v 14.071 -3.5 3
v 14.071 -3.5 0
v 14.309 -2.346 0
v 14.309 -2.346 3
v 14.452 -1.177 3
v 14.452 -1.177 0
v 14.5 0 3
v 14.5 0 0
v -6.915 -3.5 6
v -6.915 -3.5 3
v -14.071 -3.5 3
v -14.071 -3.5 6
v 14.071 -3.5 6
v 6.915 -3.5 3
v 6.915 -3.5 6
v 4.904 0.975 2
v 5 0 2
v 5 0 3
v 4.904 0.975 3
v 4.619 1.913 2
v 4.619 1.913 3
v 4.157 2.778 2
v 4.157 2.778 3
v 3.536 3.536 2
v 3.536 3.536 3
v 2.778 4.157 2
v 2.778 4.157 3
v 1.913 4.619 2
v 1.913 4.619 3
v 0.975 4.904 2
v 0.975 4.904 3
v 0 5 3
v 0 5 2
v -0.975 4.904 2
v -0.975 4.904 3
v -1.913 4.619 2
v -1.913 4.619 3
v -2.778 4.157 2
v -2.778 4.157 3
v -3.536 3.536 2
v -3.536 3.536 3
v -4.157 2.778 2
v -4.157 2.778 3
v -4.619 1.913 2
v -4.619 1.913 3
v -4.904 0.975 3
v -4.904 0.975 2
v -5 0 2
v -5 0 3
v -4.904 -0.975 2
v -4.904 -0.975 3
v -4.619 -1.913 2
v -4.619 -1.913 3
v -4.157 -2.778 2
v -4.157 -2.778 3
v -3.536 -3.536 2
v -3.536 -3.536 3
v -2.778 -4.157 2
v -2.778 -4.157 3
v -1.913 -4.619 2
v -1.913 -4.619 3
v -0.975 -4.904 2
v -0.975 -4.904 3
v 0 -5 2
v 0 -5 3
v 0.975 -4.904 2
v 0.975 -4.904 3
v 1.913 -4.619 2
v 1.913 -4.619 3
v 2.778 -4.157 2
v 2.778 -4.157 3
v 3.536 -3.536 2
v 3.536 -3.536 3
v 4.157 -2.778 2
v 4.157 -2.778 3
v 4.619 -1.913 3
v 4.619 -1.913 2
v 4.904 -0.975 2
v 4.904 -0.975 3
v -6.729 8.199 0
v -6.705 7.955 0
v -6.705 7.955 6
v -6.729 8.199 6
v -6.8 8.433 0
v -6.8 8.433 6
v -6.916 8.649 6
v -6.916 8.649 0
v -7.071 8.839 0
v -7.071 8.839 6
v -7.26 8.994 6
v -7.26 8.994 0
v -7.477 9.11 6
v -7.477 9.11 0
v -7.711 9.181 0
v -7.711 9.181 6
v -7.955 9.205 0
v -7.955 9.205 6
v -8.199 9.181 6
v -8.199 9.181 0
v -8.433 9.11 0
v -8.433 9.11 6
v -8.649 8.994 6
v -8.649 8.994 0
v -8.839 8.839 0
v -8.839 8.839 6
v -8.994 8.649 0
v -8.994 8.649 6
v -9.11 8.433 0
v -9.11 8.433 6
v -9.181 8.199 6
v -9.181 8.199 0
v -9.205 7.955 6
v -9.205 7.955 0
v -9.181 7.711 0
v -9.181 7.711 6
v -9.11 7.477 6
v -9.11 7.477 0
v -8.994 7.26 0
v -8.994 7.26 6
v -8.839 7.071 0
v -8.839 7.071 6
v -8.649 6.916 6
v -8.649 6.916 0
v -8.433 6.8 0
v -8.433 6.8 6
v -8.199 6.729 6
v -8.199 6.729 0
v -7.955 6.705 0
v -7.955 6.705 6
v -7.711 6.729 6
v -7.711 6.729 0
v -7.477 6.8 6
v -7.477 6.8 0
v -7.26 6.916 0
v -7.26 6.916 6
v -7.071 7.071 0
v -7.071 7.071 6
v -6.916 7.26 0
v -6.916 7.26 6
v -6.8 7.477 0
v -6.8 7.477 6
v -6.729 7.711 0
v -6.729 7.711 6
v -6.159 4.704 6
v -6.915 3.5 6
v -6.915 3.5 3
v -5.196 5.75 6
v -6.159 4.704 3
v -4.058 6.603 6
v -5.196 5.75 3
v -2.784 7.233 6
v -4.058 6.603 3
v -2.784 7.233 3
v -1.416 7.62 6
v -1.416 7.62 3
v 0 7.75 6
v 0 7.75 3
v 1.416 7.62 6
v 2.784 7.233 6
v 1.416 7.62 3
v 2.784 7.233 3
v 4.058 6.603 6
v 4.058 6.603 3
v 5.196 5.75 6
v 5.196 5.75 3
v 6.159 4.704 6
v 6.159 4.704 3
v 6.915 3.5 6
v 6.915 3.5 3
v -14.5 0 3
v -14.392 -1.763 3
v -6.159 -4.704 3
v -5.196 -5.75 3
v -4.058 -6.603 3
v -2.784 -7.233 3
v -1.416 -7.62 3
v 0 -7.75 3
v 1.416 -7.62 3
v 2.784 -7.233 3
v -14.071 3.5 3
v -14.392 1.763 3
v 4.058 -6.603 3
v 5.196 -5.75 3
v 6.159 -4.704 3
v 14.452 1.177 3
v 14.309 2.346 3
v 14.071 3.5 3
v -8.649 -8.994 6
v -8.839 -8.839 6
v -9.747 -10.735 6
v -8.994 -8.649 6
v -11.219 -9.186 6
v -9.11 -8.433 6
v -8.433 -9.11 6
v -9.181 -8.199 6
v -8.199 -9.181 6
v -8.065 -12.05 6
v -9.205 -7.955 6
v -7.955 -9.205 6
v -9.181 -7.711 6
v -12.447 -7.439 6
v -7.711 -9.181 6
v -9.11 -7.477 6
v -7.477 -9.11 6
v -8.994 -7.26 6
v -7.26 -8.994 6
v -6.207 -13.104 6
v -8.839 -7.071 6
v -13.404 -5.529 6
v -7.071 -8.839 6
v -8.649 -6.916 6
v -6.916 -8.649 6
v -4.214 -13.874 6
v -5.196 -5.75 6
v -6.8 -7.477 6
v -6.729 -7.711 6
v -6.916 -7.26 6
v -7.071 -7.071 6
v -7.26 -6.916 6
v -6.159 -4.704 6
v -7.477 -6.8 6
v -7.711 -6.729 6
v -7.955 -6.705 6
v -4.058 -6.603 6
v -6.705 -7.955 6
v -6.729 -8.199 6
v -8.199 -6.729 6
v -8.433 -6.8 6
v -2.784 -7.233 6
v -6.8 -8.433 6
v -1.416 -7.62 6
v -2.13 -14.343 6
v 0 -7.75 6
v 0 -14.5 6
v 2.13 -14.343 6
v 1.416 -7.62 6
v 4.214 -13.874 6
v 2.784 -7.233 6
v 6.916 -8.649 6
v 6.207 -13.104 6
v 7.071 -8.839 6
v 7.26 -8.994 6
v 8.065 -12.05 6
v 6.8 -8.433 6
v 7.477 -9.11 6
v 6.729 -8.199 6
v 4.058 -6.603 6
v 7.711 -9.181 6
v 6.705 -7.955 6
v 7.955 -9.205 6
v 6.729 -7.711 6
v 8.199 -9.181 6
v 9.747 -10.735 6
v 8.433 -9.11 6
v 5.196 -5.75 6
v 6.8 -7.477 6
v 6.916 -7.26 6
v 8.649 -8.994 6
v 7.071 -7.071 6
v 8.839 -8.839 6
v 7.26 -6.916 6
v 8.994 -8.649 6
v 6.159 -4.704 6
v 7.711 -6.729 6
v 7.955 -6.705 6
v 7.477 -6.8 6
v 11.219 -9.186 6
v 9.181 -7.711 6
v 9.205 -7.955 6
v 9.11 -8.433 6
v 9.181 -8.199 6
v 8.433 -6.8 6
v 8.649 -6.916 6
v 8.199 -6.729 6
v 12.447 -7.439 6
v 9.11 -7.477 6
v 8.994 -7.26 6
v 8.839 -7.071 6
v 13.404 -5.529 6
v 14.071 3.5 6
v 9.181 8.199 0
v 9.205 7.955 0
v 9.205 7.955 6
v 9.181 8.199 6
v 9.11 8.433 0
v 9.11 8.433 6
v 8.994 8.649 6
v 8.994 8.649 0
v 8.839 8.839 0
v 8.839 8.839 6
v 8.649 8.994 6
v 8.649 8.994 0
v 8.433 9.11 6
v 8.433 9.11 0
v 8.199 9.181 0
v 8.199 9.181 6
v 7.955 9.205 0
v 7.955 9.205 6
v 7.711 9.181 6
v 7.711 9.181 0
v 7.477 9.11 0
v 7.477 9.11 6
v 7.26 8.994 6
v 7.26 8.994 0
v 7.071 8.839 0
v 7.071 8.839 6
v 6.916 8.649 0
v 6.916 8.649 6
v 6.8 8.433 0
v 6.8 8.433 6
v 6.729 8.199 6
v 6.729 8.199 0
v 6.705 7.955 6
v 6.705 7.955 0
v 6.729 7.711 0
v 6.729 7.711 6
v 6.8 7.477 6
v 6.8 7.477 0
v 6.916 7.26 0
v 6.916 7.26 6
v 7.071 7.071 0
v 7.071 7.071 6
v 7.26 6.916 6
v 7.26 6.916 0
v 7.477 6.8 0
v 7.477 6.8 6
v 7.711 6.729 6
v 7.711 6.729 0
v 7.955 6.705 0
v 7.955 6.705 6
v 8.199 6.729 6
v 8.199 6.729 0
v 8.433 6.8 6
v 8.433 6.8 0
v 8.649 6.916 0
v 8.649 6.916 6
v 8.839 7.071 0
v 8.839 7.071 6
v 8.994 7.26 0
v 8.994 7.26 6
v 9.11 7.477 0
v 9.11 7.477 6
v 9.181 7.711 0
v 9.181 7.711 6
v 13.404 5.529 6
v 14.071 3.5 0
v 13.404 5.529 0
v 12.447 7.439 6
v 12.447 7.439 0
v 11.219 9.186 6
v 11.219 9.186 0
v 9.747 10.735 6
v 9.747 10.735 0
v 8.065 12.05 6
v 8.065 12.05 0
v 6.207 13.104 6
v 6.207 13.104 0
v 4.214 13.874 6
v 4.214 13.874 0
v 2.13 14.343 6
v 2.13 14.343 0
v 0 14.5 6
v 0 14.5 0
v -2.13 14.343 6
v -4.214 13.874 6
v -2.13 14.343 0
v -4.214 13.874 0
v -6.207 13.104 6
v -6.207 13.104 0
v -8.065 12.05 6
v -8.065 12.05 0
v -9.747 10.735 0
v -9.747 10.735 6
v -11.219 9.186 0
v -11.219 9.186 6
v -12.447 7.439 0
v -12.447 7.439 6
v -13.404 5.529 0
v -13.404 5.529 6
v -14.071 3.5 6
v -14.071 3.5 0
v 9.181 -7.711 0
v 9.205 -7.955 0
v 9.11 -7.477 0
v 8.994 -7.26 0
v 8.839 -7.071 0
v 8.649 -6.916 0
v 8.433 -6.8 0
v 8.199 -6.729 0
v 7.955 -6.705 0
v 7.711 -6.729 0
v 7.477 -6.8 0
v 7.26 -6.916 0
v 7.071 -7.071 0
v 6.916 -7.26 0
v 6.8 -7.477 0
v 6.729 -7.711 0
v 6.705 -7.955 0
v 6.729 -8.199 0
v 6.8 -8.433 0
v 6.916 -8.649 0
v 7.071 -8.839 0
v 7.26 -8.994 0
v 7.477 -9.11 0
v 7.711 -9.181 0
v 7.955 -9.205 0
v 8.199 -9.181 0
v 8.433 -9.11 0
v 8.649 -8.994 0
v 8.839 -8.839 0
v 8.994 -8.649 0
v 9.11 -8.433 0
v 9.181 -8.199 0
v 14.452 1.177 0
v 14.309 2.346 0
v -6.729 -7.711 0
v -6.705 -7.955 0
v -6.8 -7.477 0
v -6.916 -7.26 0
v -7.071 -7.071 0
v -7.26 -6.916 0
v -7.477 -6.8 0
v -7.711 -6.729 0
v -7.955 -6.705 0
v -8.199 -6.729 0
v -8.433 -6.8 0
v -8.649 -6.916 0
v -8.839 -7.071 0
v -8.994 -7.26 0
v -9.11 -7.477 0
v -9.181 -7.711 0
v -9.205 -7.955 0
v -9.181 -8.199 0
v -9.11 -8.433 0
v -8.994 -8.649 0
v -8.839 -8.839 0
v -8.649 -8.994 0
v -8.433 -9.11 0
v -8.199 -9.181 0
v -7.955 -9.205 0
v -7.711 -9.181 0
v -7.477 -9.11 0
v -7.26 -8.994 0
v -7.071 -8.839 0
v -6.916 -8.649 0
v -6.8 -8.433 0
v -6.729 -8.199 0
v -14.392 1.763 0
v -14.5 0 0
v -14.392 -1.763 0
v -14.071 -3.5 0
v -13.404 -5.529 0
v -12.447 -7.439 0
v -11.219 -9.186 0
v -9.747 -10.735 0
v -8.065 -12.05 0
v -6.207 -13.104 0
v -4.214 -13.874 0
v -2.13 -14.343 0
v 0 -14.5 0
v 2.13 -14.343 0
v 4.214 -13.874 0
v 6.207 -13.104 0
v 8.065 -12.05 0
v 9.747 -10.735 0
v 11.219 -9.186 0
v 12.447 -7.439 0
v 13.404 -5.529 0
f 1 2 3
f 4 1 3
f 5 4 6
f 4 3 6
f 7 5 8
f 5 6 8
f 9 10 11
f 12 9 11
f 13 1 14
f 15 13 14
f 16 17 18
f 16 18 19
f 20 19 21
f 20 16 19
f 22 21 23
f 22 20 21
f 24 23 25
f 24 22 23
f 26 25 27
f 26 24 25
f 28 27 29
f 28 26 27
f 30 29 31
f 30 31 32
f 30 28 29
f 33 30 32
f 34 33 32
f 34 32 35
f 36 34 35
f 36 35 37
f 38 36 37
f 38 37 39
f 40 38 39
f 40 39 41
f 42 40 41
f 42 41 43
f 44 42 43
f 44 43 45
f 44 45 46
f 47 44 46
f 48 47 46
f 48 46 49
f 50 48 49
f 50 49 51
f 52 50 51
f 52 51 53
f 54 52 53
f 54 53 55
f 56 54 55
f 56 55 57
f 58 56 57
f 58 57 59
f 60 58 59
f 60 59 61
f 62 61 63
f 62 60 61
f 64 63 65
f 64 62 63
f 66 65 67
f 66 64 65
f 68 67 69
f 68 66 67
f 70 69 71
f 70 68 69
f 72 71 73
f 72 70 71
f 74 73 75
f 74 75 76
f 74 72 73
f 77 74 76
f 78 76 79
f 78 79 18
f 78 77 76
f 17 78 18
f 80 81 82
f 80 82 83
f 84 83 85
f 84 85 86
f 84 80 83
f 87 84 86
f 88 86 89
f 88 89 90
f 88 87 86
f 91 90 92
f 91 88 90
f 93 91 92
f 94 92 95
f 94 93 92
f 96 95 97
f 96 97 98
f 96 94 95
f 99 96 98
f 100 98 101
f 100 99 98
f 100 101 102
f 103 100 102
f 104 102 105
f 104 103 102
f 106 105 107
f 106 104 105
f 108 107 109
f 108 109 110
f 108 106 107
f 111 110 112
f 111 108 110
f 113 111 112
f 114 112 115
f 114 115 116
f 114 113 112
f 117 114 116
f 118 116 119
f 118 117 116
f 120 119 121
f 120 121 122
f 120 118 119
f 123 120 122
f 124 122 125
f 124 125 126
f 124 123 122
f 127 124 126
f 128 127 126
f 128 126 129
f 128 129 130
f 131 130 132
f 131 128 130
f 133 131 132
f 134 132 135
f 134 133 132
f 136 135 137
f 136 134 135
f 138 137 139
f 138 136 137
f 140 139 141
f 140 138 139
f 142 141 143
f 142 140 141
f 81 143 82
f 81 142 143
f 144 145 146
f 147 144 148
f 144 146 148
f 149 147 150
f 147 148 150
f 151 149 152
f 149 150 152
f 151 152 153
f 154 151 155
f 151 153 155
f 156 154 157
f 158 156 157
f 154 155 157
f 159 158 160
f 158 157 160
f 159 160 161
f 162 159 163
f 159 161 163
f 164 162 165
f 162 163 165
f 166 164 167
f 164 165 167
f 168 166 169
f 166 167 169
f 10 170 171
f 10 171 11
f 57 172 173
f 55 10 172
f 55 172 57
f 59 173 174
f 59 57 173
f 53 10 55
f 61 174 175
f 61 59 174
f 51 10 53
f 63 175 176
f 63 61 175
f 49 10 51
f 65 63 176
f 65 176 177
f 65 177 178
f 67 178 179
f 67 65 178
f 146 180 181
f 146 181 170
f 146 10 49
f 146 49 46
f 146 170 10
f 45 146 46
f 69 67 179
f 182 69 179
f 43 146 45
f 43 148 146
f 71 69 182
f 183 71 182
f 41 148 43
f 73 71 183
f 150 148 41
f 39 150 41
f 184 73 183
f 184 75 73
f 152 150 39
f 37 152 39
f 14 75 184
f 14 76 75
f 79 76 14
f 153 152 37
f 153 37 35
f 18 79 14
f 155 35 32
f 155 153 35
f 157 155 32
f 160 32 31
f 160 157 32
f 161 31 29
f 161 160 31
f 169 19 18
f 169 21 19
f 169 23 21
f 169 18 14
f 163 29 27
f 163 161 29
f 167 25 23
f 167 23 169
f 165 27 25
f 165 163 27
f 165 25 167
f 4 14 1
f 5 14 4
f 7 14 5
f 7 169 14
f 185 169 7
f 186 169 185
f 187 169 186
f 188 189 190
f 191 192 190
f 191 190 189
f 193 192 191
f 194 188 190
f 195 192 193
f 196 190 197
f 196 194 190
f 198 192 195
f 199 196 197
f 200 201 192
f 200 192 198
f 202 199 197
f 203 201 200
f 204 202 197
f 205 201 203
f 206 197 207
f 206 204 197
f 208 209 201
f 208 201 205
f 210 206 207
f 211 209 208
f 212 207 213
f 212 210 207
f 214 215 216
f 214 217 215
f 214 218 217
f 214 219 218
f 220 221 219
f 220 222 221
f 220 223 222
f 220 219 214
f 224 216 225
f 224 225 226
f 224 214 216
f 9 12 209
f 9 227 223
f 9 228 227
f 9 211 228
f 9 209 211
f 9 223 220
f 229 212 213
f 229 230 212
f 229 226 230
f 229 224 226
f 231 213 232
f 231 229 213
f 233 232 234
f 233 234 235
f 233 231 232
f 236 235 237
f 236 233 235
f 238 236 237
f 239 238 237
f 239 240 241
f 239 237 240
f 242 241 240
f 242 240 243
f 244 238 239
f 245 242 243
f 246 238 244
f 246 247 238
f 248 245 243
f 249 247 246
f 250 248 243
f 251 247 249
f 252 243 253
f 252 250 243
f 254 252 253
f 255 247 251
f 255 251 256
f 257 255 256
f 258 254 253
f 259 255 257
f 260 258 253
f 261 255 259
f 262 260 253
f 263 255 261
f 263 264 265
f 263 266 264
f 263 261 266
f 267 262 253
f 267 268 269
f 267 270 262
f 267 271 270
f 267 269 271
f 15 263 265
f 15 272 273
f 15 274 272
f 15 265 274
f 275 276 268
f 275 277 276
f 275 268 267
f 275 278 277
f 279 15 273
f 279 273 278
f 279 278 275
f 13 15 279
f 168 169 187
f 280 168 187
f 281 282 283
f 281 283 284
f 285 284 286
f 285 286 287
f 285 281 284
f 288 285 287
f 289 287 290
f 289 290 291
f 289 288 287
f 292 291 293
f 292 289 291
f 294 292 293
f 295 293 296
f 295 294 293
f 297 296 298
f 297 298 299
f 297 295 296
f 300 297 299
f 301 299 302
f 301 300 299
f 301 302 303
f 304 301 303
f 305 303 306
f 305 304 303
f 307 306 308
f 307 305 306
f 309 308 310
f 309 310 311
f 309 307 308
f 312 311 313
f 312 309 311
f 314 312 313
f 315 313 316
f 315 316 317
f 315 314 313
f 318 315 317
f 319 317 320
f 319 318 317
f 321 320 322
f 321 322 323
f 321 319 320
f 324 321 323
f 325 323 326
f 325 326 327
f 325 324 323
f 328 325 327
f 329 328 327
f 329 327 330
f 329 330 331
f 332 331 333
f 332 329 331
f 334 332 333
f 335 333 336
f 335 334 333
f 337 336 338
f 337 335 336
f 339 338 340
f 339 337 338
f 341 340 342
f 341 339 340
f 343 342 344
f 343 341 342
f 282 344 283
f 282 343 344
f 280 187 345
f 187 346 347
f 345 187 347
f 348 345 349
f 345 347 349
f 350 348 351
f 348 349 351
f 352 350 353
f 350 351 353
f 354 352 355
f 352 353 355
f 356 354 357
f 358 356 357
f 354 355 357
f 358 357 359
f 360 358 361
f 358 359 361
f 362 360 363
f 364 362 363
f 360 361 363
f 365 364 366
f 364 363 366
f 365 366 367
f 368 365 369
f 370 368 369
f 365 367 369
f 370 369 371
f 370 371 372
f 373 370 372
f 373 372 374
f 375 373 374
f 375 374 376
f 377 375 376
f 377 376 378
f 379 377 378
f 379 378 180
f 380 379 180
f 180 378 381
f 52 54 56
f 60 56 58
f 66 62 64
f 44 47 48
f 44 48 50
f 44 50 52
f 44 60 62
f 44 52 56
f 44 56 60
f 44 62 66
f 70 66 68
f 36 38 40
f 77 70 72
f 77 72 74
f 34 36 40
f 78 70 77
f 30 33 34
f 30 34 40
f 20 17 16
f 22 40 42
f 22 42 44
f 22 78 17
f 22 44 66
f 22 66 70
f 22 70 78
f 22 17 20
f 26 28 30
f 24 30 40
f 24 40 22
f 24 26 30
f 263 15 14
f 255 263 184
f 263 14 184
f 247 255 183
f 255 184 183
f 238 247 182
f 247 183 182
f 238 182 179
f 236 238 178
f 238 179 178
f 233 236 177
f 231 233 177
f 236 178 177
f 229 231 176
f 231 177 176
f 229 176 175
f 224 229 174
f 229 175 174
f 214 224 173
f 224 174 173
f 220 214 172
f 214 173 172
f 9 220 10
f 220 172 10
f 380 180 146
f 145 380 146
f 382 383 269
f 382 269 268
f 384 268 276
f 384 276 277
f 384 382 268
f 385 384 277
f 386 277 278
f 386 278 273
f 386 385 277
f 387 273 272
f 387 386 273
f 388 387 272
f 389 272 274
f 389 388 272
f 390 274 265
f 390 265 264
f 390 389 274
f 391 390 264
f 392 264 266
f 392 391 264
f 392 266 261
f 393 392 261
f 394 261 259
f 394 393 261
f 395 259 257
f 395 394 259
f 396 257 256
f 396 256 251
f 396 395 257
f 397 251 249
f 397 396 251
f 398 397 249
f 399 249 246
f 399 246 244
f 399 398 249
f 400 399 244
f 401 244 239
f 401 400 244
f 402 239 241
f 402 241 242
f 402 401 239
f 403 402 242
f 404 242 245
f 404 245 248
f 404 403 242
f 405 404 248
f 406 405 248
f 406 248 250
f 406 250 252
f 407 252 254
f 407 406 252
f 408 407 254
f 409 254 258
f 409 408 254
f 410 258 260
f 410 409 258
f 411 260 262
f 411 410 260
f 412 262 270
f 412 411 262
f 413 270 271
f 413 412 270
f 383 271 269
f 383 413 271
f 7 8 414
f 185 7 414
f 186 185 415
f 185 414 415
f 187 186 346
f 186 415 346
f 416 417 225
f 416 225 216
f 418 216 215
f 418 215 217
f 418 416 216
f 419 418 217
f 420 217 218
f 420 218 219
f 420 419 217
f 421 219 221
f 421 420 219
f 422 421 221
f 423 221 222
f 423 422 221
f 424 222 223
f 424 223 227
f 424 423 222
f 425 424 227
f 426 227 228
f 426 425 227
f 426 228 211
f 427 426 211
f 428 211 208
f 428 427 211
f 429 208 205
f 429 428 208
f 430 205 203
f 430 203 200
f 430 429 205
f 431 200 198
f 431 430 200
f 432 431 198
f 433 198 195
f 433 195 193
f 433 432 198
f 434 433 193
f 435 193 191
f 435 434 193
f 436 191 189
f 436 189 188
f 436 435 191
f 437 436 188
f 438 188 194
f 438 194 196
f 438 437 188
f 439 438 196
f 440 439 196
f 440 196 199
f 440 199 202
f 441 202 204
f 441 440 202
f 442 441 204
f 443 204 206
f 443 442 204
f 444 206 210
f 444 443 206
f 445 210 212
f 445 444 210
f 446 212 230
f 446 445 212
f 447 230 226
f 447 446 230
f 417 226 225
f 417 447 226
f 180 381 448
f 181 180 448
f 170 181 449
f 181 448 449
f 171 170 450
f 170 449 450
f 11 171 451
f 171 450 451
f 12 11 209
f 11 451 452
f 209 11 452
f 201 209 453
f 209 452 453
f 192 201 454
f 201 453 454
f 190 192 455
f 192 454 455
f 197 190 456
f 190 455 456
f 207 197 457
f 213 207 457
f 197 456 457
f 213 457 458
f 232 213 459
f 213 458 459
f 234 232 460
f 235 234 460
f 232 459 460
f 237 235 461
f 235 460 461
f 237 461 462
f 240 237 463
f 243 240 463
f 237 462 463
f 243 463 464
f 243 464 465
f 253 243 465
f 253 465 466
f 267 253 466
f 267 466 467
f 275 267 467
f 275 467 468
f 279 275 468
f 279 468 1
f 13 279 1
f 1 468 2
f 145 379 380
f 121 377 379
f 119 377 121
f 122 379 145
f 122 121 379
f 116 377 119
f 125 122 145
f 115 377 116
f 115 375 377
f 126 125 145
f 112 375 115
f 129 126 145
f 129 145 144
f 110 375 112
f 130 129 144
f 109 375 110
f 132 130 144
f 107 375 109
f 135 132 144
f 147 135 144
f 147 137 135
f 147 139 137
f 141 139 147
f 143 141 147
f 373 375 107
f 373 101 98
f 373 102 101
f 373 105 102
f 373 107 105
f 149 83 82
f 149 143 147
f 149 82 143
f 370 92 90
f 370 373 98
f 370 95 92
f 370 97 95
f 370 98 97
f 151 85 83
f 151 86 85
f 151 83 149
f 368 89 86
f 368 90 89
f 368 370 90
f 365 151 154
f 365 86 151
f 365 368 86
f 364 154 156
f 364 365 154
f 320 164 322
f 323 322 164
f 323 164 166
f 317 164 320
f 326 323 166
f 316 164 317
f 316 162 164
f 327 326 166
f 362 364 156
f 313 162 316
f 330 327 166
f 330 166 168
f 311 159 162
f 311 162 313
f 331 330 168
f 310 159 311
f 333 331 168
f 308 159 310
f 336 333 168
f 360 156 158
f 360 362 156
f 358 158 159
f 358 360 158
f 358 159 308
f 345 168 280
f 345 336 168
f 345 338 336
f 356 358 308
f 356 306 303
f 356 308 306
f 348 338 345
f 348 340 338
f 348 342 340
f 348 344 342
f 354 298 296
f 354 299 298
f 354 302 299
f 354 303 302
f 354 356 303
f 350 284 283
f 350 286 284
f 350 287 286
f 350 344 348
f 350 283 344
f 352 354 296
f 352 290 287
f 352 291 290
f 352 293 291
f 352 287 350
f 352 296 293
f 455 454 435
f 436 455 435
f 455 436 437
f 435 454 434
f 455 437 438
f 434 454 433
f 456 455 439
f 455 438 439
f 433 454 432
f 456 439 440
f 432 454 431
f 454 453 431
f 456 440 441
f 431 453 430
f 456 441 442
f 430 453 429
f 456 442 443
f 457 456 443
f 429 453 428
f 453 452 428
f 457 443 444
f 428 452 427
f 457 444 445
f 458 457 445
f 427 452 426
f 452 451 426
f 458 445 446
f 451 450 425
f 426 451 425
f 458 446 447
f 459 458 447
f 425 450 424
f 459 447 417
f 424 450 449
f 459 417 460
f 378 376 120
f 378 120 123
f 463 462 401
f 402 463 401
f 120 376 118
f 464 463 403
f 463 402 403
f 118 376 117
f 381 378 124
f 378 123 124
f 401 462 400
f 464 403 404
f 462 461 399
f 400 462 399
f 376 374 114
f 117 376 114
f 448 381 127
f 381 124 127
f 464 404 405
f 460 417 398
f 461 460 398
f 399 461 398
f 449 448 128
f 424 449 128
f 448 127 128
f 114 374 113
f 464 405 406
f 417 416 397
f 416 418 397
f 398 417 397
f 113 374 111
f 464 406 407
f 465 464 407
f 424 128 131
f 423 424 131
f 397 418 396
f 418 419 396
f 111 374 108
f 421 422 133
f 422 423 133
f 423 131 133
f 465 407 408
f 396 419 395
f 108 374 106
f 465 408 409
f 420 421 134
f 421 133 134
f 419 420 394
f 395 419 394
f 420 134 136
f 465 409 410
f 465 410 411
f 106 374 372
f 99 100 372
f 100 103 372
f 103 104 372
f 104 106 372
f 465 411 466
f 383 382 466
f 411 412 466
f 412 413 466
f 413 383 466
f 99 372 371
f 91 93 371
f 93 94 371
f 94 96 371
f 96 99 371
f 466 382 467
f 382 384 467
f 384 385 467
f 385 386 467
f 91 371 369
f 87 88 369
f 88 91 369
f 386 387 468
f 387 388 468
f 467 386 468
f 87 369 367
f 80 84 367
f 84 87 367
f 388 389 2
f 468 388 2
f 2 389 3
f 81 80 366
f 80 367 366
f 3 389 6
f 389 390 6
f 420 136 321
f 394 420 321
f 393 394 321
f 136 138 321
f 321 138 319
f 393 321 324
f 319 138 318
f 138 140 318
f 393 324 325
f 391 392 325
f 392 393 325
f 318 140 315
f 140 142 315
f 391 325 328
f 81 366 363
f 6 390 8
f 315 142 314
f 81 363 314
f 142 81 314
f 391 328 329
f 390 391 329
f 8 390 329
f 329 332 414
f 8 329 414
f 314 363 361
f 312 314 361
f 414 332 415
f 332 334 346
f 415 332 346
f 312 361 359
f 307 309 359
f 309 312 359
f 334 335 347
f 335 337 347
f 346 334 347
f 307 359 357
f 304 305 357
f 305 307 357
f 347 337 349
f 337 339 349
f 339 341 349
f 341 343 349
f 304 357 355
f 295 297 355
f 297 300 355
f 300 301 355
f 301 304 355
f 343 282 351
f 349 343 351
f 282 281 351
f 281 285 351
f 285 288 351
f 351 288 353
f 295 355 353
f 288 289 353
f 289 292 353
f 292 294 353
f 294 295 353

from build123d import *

# Parameters (mm, degrees)
F0_R     = 5
F2_DEPTH = 3
F0_R_2   = 1.25
F3_DEPTH = 6
F4_DEPTH = 2


with BuildPart() as f2:
    # F0 (on Top) → F2 (new body)
    with BuildSketch(Plane.XY):
        with BuildLine():
            Line((-6.914658343, 3.5), (-14.0712472795, 3.5))
            ThreePointArc((-14.0712472795, 3.5), (-14.5, 0), (-14.0712472795, -3.5))
            Line((-14.0712472795, -3.5), (-6.914658343, -3.5))
            ThreePointArc((-6.914658343, -3.5), (-7.75, 0), (-6.914658343, 3.5))
        make_face()
        with BuildLine():
            ThreePointArc((7.75, 0), (7.5382724201, 1.7991522784), (6.914658343, 3.5))
            ThreePointArc((6.914658343, 3.5), (0, 7.75), (-6.914658343, 3.5))
            ThreePointArc((-6.914658343, 3.5), (-7.75, 0), (-6.914658343, -3.5))
            ThreePointArc((-6.914658343, -3.5), (0, -7.75), (6.914658343, -3.5))
            ThreePointArc((6.914658343, -3.5), (7.5382724201, -1.7991522784), (7.75, 0))
        make_face()
        Circle(F0_R, mode=Mode.SUBTRACT)
        with BuildLine():
            ThreePointArc((14.0712472795, -3.5), (14.3924126809, -1.7630817405), (14.5, 0))
            ThreePointArc((14.5, 0), (14.3924126809, 1.7630817405), (14.0712472795, 3.5))
            Line((14.0712472795, 3.5), (6.914658343, 3.5))
            ThreePointArc((6.914658343, 3.5), (7.5382724201, 1.7991522784), (7.75, 0))
            ThreePointArc((7.75, 0), (7.5382724201, -1.7991522784), (6.914658343, -3.5))
            Line((6.914658343, -3.5), (14.0712472795, -3.5))
        make_face()
    extrude(amount=F2_DEPTH)

    # F0 (on Top) → F3 (join)
    with BuildSketch(Plane.XY):
        with BuildLine():
            Line((6.914658343, 3.5), (14.0712472795, 3.5))
            ThreePointArc((14.0712472795, 3.5), (0, 14.5), (-14.0712472795, 3.5))
            Line((-14.0712472795, 3.5), (-6.914658343, 3.5))
            ThreePointArc((-6.914658343, 3.5), (0, 7.75), (6.914658343, 3.5))
        make_face()
        with Locations((-7.9549512883, 7.9549512883)):
            Circle(F0_R_2, mode=Mode.SUBTRACT)
        with Locations((7.9549512883, 7.9549512883)):
            Circle(F0_R_2, mode=Mode.SUBTRACT)
        with BuildLine():
            ThreePointArc((-14.0712472795, -3.5), (0, -14.5), (14.0712472795, -3.5))
            Line((14.0712472795, -3.5), (6.914658343, -3.5))
            ThreePointArc((6.914658343, -3.5), (0, -7.75), (-6.914658343, -3.5))
            Line((-6.914658343, -3.5), (-14.0712472795, -3.5))
        make_face()
        with Locations((-7.9549512883, -7.9549512883)):
            Circle(F0_R_2, mode=Mode.SUBTRACT)
        with Locations((7.9549512883, -7.9549512883)):
            Circle(F0_R_2, mode=Mode.SUBTRACT)
    extrude(amount=F3_DEPTH)

    # F0 (on Top) → F4 (join)
    with BuildSketch(Plane.XY):
        Circle(F0_R)
    extrude(amount=F4_DEPTH)


solid = f2.part
